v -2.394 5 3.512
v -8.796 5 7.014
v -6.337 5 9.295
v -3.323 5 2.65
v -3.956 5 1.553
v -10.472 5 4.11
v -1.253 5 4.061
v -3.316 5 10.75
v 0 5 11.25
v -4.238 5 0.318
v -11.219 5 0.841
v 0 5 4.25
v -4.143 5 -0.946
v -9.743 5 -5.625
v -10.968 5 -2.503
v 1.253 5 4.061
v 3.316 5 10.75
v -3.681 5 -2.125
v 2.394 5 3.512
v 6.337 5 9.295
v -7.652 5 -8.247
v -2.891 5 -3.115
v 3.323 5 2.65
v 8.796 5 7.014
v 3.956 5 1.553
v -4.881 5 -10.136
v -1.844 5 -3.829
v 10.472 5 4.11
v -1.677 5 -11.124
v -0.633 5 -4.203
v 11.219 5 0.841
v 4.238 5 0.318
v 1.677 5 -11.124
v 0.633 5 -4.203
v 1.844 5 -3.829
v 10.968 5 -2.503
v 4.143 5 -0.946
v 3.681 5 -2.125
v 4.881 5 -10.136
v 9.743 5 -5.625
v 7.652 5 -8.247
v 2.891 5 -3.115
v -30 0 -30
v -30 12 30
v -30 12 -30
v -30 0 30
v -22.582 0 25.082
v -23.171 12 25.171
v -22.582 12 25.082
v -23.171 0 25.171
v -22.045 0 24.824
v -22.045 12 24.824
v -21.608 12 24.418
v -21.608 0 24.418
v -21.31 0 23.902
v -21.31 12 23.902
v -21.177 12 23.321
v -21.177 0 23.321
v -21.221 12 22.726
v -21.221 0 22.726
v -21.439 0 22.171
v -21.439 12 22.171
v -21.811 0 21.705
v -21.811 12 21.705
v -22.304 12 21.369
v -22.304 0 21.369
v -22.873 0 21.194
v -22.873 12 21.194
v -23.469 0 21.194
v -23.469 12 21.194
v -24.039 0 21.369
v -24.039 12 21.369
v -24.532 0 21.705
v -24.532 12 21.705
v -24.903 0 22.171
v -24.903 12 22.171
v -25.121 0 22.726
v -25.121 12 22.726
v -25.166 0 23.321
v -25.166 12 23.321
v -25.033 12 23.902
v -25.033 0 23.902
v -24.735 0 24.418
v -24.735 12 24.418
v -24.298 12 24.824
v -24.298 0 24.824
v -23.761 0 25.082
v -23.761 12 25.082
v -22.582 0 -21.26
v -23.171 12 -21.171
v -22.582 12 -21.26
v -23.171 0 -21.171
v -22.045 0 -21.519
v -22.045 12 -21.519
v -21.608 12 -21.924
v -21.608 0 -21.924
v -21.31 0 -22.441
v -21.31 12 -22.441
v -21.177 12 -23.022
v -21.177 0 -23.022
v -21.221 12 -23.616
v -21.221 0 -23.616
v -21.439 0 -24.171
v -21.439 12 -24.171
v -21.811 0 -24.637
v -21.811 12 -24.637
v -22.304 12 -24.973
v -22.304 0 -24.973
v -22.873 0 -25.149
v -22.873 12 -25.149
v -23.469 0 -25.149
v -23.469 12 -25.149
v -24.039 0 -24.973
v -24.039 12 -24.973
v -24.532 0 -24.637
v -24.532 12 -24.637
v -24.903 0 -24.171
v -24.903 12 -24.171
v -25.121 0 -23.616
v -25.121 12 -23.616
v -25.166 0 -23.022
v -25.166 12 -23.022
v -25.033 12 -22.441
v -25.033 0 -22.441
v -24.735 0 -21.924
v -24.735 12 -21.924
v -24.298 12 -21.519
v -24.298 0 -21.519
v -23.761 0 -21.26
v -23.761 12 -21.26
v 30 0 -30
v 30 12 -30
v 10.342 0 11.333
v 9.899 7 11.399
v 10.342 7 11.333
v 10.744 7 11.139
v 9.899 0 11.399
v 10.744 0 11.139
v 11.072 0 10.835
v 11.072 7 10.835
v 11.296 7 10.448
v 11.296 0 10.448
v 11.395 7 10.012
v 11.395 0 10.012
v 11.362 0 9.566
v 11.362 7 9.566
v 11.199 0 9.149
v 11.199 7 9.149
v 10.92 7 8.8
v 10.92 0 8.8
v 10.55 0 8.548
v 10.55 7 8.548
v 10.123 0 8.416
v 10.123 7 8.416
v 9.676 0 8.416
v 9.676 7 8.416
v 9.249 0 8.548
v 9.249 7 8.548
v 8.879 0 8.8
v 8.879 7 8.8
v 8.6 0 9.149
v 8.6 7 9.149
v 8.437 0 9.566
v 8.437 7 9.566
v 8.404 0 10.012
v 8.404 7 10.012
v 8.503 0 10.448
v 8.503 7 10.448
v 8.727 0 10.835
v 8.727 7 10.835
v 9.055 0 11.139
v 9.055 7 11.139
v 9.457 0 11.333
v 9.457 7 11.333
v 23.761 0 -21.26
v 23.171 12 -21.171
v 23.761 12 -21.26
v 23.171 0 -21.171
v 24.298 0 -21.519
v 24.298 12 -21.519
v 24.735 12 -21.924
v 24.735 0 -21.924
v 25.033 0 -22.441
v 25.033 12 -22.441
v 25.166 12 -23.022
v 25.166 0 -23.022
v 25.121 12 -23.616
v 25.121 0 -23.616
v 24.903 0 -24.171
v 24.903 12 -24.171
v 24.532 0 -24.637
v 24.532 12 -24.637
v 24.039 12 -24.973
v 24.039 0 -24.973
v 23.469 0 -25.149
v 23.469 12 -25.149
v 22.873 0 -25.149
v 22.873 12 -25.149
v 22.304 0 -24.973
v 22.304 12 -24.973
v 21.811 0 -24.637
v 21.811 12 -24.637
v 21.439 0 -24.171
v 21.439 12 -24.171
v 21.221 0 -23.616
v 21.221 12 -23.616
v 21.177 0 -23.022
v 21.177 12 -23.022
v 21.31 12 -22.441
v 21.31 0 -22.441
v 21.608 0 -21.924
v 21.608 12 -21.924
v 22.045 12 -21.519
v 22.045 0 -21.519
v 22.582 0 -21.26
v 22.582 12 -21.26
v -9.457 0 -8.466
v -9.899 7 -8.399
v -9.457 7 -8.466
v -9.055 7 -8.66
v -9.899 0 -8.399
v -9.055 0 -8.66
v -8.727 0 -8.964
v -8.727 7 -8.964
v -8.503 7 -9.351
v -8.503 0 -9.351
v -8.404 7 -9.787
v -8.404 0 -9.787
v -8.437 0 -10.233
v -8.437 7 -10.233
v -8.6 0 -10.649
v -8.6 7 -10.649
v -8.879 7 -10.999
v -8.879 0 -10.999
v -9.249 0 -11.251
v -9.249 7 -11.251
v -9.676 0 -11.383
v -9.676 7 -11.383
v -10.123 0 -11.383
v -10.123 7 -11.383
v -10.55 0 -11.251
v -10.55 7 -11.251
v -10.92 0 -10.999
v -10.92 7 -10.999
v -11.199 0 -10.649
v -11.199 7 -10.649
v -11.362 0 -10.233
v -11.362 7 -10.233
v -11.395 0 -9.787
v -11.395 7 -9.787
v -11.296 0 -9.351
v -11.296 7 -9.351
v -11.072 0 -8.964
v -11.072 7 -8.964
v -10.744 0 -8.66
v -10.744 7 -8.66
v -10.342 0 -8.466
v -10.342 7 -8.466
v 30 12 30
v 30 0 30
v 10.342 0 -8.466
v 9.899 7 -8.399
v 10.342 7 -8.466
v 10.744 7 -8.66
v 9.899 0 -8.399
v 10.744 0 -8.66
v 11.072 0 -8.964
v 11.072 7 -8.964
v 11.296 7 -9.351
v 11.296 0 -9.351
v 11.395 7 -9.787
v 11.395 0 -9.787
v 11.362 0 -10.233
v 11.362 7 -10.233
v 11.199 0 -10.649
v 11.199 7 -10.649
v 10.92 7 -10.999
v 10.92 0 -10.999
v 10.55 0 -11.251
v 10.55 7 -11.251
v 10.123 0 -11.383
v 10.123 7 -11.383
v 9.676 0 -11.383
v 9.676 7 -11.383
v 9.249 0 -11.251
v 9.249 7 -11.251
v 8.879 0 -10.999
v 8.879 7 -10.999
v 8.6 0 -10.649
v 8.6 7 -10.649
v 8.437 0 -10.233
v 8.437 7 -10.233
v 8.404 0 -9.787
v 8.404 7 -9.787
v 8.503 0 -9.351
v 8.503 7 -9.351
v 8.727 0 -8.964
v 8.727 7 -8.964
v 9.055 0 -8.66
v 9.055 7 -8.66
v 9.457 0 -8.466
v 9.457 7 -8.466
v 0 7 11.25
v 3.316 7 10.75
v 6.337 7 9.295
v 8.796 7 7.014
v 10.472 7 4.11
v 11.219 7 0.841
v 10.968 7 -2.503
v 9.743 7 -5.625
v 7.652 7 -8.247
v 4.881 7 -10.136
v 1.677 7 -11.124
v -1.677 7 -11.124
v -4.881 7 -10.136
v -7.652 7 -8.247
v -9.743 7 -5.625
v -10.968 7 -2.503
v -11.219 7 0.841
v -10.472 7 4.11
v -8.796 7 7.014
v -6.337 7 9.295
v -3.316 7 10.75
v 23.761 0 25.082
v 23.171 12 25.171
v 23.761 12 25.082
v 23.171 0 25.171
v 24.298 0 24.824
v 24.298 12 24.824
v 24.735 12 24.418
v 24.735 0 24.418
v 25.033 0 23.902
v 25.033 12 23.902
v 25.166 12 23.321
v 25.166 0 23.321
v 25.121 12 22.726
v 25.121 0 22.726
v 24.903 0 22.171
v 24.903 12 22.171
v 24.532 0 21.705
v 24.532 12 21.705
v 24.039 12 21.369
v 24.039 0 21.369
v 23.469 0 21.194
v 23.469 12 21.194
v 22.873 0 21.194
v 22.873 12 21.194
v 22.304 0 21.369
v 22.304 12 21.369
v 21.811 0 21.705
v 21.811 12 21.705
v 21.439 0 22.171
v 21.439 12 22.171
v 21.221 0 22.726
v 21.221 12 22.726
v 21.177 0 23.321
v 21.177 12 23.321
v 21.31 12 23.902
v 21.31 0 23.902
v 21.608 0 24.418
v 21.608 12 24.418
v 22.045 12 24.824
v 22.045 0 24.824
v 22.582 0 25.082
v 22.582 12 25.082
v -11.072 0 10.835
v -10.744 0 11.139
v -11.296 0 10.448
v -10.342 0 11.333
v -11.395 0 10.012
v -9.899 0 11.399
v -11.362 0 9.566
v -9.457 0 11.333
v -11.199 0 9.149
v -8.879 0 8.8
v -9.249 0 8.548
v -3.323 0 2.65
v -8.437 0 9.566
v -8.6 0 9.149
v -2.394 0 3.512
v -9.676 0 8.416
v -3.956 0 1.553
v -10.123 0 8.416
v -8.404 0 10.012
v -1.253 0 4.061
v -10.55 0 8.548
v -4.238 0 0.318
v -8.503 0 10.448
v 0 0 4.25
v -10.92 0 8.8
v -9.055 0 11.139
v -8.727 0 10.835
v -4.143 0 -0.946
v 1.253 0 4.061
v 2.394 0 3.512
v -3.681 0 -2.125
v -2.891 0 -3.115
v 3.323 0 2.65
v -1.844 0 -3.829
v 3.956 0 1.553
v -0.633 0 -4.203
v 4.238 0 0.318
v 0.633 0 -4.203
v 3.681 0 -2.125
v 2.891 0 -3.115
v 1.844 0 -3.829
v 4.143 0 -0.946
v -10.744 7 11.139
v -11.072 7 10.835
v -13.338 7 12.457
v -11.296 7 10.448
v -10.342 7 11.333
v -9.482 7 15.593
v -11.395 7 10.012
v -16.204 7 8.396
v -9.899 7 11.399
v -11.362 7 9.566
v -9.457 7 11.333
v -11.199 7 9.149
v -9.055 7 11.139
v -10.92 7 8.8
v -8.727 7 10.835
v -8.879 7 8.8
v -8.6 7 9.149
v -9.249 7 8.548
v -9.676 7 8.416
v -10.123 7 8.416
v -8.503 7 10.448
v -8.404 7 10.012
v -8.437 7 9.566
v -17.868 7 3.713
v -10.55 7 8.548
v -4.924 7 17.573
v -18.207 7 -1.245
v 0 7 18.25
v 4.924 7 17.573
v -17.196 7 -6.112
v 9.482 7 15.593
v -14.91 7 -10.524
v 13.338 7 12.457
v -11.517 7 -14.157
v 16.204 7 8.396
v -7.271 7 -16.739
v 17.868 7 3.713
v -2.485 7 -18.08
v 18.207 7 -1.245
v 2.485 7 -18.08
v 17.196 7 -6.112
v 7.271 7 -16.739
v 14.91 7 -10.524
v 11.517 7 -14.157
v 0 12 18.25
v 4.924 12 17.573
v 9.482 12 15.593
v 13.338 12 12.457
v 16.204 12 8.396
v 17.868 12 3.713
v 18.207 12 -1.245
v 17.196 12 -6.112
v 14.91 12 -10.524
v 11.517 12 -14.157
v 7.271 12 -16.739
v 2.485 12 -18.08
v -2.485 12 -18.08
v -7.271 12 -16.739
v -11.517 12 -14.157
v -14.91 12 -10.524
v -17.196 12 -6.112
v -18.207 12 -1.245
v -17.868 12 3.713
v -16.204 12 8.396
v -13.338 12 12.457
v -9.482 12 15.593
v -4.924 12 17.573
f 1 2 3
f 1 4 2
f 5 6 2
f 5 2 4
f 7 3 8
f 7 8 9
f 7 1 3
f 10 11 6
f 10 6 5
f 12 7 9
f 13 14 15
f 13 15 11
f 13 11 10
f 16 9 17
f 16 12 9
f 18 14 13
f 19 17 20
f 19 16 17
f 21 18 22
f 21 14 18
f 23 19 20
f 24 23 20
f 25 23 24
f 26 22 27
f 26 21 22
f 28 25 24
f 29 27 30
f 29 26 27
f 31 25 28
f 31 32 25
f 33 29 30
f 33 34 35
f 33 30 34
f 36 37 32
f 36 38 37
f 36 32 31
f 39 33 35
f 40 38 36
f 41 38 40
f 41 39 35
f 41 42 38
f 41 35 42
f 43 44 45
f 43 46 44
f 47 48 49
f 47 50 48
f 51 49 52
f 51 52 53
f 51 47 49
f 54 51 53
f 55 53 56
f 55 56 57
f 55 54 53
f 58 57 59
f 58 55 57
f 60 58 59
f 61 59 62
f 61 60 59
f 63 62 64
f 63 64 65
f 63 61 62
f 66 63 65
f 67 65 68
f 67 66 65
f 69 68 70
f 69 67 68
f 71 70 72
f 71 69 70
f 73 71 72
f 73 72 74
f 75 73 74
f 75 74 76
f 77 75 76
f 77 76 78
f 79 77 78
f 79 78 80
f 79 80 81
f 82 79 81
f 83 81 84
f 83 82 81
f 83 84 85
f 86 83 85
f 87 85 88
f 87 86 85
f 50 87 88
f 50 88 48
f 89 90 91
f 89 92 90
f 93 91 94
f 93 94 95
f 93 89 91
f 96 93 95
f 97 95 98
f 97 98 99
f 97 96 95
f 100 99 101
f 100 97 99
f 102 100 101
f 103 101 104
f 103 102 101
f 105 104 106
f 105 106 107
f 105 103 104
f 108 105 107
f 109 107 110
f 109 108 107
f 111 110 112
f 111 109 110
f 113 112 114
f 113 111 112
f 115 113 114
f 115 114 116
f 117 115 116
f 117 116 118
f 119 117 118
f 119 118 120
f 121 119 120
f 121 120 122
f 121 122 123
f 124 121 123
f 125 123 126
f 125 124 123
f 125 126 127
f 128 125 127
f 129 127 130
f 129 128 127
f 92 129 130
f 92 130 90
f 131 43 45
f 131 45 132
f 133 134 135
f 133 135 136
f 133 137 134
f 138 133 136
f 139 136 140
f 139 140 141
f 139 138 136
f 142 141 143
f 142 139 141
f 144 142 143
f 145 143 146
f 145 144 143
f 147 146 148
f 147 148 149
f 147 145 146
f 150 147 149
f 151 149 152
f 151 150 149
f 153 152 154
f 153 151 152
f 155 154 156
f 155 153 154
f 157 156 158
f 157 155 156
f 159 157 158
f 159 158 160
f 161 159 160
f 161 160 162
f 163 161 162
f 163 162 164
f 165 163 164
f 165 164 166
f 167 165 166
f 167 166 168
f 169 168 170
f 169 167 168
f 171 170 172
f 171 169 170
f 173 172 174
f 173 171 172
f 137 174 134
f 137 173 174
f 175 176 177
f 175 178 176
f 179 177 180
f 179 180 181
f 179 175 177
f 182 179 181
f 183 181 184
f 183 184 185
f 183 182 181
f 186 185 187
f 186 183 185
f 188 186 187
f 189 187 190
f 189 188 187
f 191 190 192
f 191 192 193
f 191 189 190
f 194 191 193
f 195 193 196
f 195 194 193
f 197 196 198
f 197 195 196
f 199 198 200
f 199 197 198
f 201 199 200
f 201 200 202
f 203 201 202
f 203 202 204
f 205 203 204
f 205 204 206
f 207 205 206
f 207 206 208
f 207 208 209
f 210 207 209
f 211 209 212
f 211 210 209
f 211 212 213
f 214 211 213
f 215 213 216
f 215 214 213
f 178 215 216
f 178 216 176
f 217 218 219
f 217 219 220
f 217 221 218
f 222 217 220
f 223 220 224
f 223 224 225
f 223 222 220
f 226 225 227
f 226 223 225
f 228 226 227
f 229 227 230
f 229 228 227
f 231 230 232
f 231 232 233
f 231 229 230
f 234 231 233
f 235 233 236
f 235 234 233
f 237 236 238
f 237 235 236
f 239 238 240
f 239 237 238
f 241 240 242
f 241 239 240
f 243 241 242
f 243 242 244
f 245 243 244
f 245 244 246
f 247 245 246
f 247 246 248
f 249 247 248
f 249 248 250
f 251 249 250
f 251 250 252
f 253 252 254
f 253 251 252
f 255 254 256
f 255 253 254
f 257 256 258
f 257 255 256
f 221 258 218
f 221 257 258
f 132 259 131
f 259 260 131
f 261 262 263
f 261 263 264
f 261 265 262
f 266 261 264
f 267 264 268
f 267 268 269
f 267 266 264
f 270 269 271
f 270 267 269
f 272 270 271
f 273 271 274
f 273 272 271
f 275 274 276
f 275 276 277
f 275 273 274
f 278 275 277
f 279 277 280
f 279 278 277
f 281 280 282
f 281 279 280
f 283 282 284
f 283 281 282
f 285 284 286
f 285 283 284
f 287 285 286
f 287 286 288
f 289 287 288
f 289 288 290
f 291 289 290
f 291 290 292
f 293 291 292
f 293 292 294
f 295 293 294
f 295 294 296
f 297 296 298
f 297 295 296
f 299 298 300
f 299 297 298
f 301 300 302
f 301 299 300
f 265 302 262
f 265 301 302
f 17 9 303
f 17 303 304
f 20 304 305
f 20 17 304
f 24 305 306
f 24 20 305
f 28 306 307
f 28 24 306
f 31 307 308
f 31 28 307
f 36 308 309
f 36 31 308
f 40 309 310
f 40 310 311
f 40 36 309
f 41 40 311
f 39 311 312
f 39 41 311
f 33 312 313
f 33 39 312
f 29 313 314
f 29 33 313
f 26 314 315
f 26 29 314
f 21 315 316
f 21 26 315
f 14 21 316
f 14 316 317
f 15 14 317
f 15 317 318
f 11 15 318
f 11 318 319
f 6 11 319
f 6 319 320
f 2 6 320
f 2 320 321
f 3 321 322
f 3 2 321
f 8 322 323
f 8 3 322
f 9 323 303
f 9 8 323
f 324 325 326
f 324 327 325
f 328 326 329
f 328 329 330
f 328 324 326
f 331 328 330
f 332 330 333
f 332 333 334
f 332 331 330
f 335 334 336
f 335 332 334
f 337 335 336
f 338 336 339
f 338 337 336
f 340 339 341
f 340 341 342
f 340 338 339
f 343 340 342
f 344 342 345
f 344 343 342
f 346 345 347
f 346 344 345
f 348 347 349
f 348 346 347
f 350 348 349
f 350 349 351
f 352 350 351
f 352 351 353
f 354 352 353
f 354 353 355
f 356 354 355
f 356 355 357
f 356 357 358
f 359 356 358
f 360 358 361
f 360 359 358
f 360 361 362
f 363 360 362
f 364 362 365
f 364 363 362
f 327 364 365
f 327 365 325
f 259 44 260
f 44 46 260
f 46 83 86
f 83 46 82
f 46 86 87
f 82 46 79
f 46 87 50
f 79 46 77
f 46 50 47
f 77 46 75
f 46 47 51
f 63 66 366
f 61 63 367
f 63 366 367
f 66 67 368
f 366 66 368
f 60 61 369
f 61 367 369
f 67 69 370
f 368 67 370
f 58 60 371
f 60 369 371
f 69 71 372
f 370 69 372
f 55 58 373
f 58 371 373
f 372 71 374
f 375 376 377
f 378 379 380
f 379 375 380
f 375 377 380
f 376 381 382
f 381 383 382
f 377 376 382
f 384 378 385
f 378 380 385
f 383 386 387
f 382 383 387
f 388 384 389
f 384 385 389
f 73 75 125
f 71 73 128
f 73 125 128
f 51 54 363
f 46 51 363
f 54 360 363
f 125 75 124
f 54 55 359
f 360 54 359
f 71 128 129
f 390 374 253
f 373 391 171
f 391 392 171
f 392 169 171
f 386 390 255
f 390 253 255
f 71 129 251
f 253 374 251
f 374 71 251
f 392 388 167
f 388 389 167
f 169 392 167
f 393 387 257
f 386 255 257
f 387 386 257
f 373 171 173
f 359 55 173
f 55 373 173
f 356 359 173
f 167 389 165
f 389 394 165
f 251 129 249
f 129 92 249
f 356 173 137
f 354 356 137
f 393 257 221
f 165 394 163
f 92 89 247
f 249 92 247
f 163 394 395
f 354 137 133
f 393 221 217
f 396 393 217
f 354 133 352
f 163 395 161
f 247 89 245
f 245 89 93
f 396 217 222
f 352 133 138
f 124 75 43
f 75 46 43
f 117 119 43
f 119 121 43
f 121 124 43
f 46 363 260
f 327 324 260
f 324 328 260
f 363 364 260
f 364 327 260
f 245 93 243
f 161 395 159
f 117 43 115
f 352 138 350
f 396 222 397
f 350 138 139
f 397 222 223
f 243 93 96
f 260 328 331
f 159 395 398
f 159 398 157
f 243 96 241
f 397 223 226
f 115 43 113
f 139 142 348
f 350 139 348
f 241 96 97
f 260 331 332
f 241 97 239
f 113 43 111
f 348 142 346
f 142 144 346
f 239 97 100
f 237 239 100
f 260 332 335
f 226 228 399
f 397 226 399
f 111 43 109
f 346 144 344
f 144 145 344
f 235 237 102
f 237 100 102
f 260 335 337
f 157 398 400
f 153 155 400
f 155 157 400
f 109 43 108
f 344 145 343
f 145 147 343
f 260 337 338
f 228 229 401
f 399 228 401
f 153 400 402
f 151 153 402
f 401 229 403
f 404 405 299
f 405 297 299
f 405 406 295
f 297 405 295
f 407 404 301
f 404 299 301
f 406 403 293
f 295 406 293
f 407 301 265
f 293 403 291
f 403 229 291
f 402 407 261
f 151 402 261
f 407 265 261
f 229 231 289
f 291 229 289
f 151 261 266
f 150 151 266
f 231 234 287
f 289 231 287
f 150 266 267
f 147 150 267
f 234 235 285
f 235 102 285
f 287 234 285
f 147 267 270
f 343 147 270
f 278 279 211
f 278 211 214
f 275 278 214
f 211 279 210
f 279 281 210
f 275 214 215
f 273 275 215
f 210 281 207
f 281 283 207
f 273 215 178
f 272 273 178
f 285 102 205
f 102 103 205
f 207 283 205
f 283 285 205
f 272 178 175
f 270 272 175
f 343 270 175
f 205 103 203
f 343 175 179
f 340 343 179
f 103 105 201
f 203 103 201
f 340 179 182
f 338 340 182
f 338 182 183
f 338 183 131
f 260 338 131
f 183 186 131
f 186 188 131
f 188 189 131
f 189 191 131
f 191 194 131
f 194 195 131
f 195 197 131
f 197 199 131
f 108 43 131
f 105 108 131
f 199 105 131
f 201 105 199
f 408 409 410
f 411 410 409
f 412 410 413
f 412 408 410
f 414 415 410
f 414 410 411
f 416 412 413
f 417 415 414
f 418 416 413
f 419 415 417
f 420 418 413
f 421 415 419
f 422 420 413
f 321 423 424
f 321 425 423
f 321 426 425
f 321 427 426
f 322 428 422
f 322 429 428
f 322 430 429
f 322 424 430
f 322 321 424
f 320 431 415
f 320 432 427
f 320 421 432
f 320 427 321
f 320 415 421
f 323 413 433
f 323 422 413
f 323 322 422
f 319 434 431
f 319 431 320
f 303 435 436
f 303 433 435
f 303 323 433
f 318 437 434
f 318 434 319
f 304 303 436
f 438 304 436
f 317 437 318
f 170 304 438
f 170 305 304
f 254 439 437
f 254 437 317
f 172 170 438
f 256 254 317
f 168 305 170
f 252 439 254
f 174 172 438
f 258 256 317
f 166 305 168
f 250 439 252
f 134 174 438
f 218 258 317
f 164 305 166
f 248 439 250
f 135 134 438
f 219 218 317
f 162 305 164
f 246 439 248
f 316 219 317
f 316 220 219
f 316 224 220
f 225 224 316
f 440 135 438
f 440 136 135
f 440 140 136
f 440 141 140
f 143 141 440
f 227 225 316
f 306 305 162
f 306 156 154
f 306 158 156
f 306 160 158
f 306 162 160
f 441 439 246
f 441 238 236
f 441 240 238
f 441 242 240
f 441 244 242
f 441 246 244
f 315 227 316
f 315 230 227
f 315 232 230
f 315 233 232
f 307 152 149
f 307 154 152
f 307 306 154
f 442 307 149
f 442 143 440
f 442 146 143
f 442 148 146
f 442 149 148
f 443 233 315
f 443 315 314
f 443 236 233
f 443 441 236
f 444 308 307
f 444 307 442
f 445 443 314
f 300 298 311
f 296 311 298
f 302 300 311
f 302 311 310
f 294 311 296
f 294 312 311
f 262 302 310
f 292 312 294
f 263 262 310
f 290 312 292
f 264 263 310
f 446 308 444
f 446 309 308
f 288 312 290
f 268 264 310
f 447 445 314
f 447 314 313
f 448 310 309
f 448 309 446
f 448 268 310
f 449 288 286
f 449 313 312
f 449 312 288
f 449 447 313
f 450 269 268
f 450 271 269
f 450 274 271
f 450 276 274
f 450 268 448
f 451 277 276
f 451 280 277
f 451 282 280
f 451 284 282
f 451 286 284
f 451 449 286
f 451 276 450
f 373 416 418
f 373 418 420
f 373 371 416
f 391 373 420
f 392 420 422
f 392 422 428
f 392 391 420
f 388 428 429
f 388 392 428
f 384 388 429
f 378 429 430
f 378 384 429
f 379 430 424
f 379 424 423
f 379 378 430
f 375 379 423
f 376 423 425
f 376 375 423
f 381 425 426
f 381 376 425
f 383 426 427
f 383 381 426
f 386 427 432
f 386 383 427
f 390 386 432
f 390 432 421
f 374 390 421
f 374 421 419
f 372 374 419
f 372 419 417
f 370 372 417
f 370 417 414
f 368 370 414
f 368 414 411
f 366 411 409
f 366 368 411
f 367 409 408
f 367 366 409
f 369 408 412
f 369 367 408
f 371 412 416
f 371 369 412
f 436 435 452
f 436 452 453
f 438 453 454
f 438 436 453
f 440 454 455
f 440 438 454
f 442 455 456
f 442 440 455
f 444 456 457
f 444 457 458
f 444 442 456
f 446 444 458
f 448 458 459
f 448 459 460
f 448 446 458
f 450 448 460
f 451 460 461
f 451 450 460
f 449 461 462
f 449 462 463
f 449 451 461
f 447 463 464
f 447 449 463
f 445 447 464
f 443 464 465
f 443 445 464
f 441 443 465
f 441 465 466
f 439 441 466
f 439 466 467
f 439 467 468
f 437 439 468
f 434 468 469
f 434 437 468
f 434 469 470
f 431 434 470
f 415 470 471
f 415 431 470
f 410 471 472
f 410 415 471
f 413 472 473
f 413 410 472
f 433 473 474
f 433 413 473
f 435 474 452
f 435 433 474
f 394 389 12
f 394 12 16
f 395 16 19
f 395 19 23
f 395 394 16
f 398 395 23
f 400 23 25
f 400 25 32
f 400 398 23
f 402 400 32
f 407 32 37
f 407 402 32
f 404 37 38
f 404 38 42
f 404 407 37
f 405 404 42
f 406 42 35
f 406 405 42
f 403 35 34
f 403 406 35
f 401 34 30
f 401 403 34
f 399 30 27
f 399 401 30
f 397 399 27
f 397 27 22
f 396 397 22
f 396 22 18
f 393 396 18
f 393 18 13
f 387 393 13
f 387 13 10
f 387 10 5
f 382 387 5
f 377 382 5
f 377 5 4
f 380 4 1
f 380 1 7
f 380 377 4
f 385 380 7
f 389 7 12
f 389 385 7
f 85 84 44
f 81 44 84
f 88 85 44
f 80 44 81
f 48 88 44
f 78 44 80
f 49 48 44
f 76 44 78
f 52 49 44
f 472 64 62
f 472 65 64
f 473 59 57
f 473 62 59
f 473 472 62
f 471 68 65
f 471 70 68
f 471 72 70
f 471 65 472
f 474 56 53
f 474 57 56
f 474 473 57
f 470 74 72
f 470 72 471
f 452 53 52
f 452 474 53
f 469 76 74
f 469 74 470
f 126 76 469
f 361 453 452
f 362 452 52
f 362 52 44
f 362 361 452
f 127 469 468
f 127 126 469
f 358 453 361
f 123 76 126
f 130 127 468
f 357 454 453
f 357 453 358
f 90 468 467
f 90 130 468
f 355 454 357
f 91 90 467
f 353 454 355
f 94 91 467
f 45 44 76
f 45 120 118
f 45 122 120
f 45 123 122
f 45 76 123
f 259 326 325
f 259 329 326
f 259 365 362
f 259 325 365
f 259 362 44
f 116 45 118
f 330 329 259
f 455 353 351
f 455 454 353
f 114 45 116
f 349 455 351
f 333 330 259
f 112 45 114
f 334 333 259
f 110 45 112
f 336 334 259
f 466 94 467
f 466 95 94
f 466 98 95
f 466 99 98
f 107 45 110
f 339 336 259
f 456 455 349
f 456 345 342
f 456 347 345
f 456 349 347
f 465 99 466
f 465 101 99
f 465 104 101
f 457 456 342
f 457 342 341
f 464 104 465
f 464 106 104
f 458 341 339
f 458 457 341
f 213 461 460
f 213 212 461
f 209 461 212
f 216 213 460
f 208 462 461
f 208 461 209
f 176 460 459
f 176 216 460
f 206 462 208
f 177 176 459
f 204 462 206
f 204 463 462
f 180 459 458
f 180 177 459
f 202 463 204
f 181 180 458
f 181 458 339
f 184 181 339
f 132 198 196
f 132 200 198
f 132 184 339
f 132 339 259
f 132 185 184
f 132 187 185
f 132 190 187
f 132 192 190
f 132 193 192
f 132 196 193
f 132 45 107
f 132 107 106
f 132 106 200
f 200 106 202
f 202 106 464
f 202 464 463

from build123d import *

# Parameters (mm, degrees)
SKETCH_1_W      = 60
SKETCH_1_H      = 60
SKETCH_1_R      = 1.5
SKETCH_1_R_2    = 2
SKETCH_1_R_3    = 4.25
EXTRUDE_1_DEPTH = 5
SKETCH_2_W      = 60
SKETCH_2_H      = 60
SKETCH_2_R      = 2
SKETCH_2_R_2    = 1.5
SKETCH_2_R_3    = 11.25
EXTRUDE_2_DEPTH = 2
SKETCH_3_W      = 60
SKETCH_3_H      = 60
SKETCH_3_R      = 18.25
SKETCH_3_R_2    = 2
EXTRUDE_3_DEPTH = 5


with BuildPart() as part:
    # 草图1 → 凸台-拉伸1 (new body)
    with BuildSketch(Plane(origin=(0, 0, 0), x_dir=(1, 0, 0), z_dir=(0, 1, 0))):
        Rectangle(SKETCH_1_W, SKETCH_1_H)
        with Locations(Location((-9.899494937, 9.899494937, 0), (0, 0, 270))):
            Circle(SKETCH_1_R, mode=Mode.SUBTRACT)
        with Locations(Location((9.899494937, 9.899494937, 0), (0, 0, 270))):
            Circle(SKETCH_1_R, mode=Mode.SUBTRACT)
        with Locations(Location((9.899494937, -9.899494937, 0), (0, 0, 270))):
            Circle(SKETCH_1_R, mode=Mode.SUBTRACT)
        with Locations(Location((-9.899494937, -9.899494937, 0), (0, 0, 270))):
            Circle(SKETCH_1_R, mode=Mode.SUBTRACT)
        with Locations(Location((-23.171320344, 23.171320344, 0), (0, 0, 270))):
            Circle(SKETCH_1_R_2, mode=Mode.SUBTRACT)
        with Locations(Location((23.171320344, 23.171320344, 0), (0, 0, 270))):
            Circle(SKETCH_1_R_2, mode=Mode.SUBTRACT)
        with Locations(Location((-23.171320344, -23.171320344, 0), (0, 0, 270))):
            Circle(SKETCH_1_R_2, mode=Mode.SUBTRACT)
        with Locations(Location((23.171320344, -23.171320344, 0), (0, 0, 270))):
            Circle(SKETCH_1_R_2, mode=Mode.SUBTRACT)
        with Locations(Location((0, 0, 0), (0, 0, 270))):
            Circle(SKETCH_1_R_3, mode=Mode.SUBTRACT)
    extrude(amount=EXTRUDE_1_DEPTH)

    # 草图2 → 凸台-拉伸2 (add)
    with BuildSketch(Plane(origin=(0, 5, 0), x_dir=(1, 0, 0), z_dir=(0, 1, 0))):
        Rectangle(SKETCH_2_W, SKETCH_2_H)
        with Locations(Location((-23.171320344, -23.171320344, 0), (0, 0, 270))):
            Circle(SKETCH_2_R, mode=Mode.SUBTRACT)
        with Locations(Location((23.171320344, 23.171320344, 0), (0, 0, 270))):
            Circle(SKETCH_2_R, mode=Mode.SUBTRACT)
        with Locations(Location((23.171320344, -23.171320344, 0), (0, 0, 270))):
            Circle(SKETCH_2_R, mode=Mode.SUBTRACT)
        with Locations(Location((-23.171320344, 23.171320344, 0), (0, 0, 270))):
            Circle(SKETCH_2_R, mode=Mode.SUBTRACT)
        with Locations(Location((-9.899494937, -9.899494937, 0), (0, 0, 270))):
            Circle(SKETCH_2_R_2, mode=Mode.SUBTRACT)
        with Locations(Location((9.899494937, -9.899494937, 0), (0, 0, 270))):
            Circle(SKETCH_2_R_2, mode=Mode.SUBTRACT)
        with Locations(Location((9.899494937, 9.899494937, 0), (0, 0, 270))):
            Circle(SKETCH_2_R_2, mode=Mode.SUBTRACT)
        with Locations(Location((-9.899494937, 9.899494937, 0), (0, 0, 270))):
            Circle(SKETCH_2_R_2, mode=Mode.SUBTRACT)
        with Locations(Location((0, 0, 0), (0, 0, 270))):
            Circle(SKETCH_2_R_3, mode=Mode.SUBTRACT)
    extrude(amount=EXTRUDE_2_DEPTH)

    # 草图3 → 凸台-拉伸3 (add)
    with BuildSketch(Plane(origin=(0, 7, 0), x_dir=(1, 0, 0), z_dir=(0, 1, 0))):
        Rectangle(SKETCH_3_W, SKETCH_3_H)
        with Locations(Location((0, 0, 0), (0, 0, 270))):
            Circle(SKETCH_3_R, mode=Mode.SUBTRACT)
        with Locations(Location((-23.171320344, -23.171320344, 0), (0, 0, 270))):
            Circle(SKETCH_3_R_2, mode=Mode.SUBTRACT)
        with Locations(Location((23.171320344, 23.171320344, 0), (0, 0, 270))):
            Circle(SKETCH_3_R_2, mode=Mode.SUBTRACT)
        with Locations(Location((23.171320344, -23.171320344, 0), (0, 0, 270))):
            Circle(SKETCH_3_R_2, mode=Mode.SUBTRACT)
        with Locations(Location((-23.171320344, 23.171320344, 0), (0, 0, 270))):
            Circle(SKETCH_3_R_2, mode=Mode.SUBTRACT)
    extrude(amount=EXTRUDE_3_DEPTH)


solid = part.part
